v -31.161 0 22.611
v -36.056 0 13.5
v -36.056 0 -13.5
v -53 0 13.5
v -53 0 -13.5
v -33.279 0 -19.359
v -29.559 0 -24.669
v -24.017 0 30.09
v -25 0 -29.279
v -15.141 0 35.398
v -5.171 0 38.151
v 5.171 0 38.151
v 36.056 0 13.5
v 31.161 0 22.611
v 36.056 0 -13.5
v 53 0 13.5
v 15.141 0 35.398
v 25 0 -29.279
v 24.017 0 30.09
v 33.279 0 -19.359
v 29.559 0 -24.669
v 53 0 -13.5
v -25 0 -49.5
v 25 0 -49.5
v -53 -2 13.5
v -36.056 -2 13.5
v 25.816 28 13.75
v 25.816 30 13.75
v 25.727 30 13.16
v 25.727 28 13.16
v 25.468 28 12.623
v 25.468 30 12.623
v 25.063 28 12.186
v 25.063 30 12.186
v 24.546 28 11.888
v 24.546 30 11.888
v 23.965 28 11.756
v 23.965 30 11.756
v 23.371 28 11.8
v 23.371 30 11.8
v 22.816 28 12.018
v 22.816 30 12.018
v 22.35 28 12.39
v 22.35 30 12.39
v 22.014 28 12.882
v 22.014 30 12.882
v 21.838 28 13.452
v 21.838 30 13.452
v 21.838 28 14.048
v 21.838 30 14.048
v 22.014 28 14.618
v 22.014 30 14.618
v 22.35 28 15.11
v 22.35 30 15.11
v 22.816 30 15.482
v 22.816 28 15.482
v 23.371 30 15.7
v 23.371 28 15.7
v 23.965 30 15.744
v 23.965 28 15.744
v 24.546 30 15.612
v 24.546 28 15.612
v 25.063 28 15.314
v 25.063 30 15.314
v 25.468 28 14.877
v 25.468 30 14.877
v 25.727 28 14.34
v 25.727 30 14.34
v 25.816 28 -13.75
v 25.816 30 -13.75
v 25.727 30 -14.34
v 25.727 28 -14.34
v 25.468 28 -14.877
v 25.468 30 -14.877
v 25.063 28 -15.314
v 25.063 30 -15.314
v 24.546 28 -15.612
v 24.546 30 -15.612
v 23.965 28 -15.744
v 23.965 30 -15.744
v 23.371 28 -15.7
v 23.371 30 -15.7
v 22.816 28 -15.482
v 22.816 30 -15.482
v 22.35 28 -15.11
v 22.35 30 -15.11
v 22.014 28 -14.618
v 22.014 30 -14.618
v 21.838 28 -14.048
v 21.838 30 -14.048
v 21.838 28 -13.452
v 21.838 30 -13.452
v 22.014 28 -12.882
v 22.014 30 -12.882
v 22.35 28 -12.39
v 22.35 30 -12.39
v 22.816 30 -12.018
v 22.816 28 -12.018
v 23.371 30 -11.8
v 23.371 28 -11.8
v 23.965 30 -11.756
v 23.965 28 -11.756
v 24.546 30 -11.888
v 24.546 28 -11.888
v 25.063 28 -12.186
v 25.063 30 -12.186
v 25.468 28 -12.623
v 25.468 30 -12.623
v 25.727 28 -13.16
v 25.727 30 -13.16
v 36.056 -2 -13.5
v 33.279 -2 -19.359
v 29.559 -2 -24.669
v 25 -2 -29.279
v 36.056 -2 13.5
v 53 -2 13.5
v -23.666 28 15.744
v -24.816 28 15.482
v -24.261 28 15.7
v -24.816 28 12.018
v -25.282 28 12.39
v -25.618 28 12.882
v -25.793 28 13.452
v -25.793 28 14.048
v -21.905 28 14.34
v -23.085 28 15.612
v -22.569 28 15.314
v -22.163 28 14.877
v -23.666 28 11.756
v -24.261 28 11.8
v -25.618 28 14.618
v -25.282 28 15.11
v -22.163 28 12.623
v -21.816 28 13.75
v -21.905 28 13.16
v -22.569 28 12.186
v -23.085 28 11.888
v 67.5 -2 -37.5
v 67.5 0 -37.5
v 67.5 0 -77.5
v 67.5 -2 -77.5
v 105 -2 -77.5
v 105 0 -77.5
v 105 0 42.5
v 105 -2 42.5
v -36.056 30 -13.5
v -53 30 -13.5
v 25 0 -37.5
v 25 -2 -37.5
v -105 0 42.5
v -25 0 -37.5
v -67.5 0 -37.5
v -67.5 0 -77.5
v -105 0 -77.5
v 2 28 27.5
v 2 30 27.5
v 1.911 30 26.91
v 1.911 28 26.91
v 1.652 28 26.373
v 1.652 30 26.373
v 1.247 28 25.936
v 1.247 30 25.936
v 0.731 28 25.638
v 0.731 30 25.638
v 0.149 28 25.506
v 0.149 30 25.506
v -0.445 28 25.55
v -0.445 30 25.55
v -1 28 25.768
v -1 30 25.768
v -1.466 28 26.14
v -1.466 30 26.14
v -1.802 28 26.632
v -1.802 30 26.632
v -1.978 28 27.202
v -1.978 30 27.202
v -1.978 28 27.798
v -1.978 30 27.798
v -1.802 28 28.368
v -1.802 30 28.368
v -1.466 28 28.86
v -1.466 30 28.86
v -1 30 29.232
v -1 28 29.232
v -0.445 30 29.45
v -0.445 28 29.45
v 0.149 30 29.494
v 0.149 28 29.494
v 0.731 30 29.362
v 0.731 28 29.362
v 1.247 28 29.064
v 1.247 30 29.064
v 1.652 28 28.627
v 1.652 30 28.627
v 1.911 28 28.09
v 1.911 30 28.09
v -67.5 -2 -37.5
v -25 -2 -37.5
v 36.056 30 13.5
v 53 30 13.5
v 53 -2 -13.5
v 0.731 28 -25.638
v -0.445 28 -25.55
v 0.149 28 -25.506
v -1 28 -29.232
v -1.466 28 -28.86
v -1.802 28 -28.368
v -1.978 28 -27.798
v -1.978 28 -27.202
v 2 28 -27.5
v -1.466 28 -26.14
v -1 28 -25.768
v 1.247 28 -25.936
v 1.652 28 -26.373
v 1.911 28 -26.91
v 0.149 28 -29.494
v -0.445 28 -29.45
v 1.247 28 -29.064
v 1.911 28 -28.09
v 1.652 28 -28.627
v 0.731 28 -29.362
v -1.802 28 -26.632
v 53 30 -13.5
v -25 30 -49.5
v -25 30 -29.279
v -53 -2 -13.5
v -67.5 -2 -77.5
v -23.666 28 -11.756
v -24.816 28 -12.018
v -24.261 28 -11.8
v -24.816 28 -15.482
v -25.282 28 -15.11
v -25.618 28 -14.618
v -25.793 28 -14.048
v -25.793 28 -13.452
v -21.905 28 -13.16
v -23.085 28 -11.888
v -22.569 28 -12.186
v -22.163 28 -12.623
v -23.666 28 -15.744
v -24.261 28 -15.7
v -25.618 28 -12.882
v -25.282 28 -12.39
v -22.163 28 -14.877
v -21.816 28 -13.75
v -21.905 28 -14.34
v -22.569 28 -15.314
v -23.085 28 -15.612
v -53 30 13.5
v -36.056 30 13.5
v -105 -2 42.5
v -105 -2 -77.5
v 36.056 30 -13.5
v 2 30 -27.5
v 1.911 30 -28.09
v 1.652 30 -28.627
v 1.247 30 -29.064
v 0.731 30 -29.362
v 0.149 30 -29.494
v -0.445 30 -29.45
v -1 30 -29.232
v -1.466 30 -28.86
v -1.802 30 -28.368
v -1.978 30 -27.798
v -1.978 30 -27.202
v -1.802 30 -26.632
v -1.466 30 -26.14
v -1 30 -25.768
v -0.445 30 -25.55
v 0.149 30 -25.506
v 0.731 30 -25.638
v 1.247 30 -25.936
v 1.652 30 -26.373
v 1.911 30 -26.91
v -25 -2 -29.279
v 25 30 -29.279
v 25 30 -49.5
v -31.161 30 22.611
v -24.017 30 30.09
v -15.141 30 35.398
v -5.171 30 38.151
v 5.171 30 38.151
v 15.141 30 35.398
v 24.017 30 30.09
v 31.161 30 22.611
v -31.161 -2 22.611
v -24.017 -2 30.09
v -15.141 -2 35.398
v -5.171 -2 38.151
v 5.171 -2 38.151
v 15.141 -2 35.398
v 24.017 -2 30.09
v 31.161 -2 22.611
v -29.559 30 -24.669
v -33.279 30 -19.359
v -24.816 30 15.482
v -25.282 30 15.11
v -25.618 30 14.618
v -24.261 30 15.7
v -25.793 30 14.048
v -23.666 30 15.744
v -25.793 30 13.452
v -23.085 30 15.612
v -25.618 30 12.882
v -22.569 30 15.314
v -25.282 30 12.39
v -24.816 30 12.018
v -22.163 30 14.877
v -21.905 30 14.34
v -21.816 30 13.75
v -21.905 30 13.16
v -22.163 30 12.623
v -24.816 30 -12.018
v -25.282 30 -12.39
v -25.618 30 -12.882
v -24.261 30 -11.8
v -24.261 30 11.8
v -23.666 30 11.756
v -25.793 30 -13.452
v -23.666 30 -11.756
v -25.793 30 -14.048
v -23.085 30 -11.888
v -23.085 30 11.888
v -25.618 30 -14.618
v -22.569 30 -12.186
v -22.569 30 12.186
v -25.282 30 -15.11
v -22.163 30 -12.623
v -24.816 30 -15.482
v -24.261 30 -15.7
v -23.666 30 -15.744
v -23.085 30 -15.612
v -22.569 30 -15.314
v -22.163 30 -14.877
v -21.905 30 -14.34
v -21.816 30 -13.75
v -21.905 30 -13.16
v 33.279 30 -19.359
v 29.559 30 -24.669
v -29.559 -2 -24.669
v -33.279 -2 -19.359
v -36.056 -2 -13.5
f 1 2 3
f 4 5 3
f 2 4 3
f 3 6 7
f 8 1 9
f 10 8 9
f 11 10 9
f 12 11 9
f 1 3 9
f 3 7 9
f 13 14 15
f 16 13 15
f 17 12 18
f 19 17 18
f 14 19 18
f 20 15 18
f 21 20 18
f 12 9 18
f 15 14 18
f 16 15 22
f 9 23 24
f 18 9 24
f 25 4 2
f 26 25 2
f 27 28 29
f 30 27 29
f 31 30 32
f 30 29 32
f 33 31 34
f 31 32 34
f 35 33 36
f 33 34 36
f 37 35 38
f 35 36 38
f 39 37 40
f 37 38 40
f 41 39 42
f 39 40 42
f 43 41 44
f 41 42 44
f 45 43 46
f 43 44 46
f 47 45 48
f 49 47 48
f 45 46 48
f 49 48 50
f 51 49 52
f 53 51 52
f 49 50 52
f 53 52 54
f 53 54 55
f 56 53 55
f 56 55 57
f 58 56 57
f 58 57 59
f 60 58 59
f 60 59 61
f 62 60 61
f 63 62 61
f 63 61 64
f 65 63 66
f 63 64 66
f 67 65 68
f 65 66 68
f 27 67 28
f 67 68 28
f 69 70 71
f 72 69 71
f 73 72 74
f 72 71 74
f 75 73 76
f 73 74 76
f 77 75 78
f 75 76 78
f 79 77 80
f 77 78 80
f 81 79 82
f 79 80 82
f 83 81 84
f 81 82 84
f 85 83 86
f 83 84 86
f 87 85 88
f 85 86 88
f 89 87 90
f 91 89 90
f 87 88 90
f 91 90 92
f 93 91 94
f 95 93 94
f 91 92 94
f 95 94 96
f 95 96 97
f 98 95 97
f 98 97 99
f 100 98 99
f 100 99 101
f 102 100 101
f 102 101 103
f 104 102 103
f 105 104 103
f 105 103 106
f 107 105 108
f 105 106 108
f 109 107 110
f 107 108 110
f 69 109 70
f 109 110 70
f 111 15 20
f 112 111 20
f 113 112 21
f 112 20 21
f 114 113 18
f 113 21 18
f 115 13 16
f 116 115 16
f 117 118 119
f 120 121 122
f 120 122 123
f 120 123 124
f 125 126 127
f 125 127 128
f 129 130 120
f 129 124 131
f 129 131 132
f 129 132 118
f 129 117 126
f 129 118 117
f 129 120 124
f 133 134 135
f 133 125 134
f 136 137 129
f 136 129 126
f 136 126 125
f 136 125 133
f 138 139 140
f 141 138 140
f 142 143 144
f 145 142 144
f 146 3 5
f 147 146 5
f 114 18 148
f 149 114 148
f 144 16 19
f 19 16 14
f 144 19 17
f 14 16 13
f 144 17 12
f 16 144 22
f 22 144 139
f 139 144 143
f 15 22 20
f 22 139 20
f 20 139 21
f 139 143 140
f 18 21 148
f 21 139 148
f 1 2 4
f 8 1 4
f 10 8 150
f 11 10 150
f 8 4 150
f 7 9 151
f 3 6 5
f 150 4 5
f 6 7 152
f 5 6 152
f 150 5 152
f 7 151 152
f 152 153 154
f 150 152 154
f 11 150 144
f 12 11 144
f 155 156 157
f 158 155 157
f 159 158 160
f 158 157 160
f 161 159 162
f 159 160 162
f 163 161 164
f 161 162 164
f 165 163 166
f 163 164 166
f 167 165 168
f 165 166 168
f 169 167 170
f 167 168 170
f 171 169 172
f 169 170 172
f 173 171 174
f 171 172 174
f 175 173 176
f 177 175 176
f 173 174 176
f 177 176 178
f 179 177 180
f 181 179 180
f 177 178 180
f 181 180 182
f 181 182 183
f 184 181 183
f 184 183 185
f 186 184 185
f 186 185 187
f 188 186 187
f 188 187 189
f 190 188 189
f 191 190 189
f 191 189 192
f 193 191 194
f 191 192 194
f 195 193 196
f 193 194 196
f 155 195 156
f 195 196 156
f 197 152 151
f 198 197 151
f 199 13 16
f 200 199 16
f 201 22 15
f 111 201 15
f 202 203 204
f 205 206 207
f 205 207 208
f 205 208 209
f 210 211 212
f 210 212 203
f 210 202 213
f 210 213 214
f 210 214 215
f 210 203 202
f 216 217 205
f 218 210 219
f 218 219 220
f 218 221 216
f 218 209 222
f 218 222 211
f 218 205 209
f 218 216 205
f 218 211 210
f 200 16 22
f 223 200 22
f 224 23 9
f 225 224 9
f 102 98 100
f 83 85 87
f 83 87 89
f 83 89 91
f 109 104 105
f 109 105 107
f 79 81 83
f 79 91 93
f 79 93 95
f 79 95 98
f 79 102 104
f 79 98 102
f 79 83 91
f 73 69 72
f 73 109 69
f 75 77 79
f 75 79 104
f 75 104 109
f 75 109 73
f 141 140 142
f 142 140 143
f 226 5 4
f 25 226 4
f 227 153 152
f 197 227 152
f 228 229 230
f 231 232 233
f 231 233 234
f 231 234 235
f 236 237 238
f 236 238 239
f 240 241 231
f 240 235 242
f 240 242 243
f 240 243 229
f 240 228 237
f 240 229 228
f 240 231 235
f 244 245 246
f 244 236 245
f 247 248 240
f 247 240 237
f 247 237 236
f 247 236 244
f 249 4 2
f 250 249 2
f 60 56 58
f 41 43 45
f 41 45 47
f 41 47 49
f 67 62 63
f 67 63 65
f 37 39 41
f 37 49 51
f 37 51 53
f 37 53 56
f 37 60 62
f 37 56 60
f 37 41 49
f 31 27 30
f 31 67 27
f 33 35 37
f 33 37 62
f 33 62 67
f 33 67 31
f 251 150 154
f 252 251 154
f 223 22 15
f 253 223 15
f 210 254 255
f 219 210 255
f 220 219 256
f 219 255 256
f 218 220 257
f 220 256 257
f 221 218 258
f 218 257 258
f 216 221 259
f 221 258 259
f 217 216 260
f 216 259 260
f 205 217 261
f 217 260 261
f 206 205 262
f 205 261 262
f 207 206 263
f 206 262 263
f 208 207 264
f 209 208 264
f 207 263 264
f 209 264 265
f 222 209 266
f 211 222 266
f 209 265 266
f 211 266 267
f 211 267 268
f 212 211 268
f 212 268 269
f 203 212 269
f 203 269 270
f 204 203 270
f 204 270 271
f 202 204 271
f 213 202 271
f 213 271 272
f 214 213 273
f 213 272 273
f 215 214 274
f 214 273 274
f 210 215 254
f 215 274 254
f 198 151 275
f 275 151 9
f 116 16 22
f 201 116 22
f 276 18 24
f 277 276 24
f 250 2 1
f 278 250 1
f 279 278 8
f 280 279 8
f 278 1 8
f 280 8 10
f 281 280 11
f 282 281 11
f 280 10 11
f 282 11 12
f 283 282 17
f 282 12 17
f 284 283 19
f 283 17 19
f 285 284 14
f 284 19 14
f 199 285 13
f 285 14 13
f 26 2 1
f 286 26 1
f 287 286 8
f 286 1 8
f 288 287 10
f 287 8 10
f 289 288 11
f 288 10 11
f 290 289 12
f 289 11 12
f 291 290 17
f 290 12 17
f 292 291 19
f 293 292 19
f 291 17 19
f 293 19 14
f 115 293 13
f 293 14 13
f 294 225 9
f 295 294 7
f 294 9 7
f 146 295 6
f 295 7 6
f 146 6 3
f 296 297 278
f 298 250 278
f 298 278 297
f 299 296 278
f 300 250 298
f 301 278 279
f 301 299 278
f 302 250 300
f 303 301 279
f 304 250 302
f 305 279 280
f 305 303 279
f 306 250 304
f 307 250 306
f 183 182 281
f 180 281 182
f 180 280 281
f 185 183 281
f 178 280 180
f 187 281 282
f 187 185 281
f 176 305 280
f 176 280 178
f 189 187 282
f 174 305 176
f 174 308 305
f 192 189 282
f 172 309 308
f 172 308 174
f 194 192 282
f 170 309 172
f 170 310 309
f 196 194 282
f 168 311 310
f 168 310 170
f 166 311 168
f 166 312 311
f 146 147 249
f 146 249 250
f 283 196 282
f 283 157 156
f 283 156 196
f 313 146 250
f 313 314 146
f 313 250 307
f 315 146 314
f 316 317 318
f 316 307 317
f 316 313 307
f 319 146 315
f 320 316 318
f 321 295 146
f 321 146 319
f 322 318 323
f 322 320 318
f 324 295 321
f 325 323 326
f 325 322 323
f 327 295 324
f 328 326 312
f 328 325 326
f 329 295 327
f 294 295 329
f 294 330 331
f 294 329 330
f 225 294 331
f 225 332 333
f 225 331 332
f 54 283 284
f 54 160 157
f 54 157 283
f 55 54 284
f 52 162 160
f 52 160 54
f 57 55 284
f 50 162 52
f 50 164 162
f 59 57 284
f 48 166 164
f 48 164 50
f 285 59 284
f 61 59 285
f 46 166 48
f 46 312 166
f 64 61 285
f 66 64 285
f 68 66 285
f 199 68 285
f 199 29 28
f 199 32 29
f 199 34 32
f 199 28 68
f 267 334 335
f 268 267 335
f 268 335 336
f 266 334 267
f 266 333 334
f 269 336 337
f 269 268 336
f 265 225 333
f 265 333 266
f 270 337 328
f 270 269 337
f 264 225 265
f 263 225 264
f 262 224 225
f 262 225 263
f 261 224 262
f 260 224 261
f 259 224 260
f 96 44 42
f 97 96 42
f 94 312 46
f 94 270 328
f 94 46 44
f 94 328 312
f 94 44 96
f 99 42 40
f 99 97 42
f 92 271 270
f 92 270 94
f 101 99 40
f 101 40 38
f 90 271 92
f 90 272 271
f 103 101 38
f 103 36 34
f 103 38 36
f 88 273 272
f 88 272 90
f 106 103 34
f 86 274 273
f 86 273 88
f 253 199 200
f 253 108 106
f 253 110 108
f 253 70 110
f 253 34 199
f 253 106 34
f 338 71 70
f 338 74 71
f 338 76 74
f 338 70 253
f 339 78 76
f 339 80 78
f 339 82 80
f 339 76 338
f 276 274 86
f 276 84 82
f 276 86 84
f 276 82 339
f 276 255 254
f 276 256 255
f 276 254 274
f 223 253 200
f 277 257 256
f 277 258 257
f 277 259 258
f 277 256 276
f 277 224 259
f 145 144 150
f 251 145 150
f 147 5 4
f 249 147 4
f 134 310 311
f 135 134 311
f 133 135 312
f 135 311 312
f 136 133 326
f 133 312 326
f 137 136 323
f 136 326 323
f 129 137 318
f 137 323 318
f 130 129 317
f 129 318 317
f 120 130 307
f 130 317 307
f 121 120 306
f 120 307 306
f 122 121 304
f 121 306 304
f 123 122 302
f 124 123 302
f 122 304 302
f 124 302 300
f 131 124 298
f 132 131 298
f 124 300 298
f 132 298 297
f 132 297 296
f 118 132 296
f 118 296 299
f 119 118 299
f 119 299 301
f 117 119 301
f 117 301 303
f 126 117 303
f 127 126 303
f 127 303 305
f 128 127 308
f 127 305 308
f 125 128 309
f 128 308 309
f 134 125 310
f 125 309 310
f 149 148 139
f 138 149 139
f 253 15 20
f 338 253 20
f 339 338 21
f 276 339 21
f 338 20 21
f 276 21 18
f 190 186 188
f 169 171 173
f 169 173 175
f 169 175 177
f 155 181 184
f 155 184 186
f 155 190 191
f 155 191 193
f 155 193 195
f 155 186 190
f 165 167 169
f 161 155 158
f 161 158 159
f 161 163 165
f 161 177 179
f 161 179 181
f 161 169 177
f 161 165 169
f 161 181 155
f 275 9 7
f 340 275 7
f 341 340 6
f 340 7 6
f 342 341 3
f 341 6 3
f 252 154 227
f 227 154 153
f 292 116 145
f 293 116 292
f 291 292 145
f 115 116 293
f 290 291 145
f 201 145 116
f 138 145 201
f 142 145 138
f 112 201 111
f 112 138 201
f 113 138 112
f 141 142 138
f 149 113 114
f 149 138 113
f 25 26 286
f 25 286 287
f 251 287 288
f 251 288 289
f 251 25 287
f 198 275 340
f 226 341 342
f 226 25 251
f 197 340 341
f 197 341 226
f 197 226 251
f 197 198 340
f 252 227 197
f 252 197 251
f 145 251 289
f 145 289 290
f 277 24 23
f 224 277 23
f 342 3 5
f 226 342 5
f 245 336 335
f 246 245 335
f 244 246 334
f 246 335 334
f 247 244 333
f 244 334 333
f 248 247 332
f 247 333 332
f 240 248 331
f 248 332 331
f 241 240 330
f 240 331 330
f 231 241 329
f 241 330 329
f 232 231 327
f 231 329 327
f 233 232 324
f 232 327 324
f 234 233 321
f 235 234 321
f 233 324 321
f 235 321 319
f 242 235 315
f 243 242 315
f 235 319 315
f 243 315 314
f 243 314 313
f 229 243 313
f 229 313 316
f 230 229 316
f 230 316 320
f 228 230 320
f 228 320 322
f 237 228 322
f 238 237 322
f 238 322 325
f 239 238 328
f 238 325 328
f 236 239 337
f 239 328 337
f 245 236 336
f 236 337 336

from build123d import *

# Parameters (mm, degrees)
BOSS_EXTRUDE1_DEPTH = 30
BOSS_EXTRUDE2_DEPTH = 2
SKETCH3_R           = 2
CUT_EXTRUDE1_DEPTH  = 2


with BuildPart() as part:
    # Sketch1 → Boss-Extrude1 (new body)
    with BuildSketch(Plane(origin=(0, 0, 0), x_dir=(1, 0, 0), z_dir=(0, 1, 0))):
        with BuildLine():
            Line((36.055512755, -13.5), (-36.055512755, -13.5))
            ThreePointArc((-36.055512755, -13.5), (0, -38.5), (36.055512755, -13.5))
        make_face()
        with BuildLine():
            Line((36.055512755, 13.5), (-36.055512755, 13.5))
            ThreePointArc((-36.055512755, 13.5), (-38.5, 0), (-36.055512755, -13.5))
            Line((-36.055512755, -13.5), (36.055512755, -13.5))
            ThreePointArc((36.055512755, -13.5), (37.883949379, -6.859765264), (38.5, 0))
            ThreePointArc((38.5, 0), (37.883949379, 6.859765264), (36.055512755, 13.5))
        make_face()
        with BuildLine():
            Line((-36.055512755, 13.5), (-53, 13.5))
            Line((-53, 13.5), (-53, -13.5))
            Line((-53, -13.5), (-36.055512755, -13.5))
            ThreePointArc((-36.055512755, -13.5), (-38.5, 0), (-36.055512755, 13.5))
        make_face()
        with BuildLine():
            ThreePointArc((25, 29.278831944), (0, 38.5), (-25, 29.278831944))
            Line((-25, 29.278831944), (-25, 27.5))
            Line((-25, 27.5), (25, 27.5))
            Line((25, 27.5), (25, 29.278831944))
        make_face()
        with BuildLine():
            Line((53, 13.5), (36.055512755, 13.5))
            ThreePointArc((36.055512755, 13.5), (37.883949379, 6.859765264), (38.5, 0))
            ThreePointArc((38.5, 0), (37.883949379, -6.859765264), (36.055512755, -13.5))
            Line((36.055512755, -13.5), (53, -13.5))
            Line((53, -13.5), (53, 13.5))
        make_face()
        with BuildLine():
            ThreePointArc((-25, 29.278831944), (-31.530727772, 22.092152593), (-36.055512755, 13.5))
            Line((-36.055512755, 13.5), (36.055512755, 13.5))
            ThreePointArc((36.055512755, 13.5), (31.530727772, 22.092152593), (25, 29.278831944))
            Line((25, 29.278831944), (25, 27.5))
            Line((25, 27.5), (-25, 27.5))
            Line((-25, 27.5), (-25, 29.278831944))
        make_face()
        with BuildLine():
            Line((-25, 49.5), (-25, 29.278831944))
            ThreePointArc((-25, 29.278831944), (0, 38.5), (25, 29.278831944))
            Line((25, 29.278831944), (25, 49.5))
            Line((25, 49.5), (-25, 49.5))
        make_face()
    extrude(amount=BOSS_EXTRUDE1_DEPTH)

    # Sketch3 → Cut-Extrude1 (cut)
    with BuildSketch(Plane(origin=(0, 30, 0), x_dir=(1, 0, 0), z_dir=(0, 1, 0))):
        with Locations((0, 27.5)):
            Circle(SKETCH3_R)
        with Locations((23.815698604, 13.75)):
            Circle(SKETCH3_R)
        with Locations((23.815698604, -13.75)):
            Circle(SKETCH3_R)
        with Locations((0, -27.5)):
            Circle(SKETCH3_R)
        with Locations((-23.815698604, -13.75)):
            Circle(SKETCH3_R)
        with Locations((-23.815698604, 13.75)):
            Circle(SKETCH3_R)
    extrude(amount=-CUT_EXTRUDE1_DEPTH, mode=Mode.SUBTRACT)


with BuildPart() as body_2:
    # Sketch2 → Boss-Extrude2 (new body)
    with BuildSketch(Plane(origin=(0, 0, 0), x_dir=(-1, 0, 0), z_dir=(0, -1, 0))):
        with BuildLine():
            Line((-105, -42.5), (105, -42.5))
            Line((105, -42.5), (105, 77.5))
            Line((105, 77.5), (67.5, 77.5))
            Line((67.5, 77.5), (67.5, 37.5))
            Line((67.5, 37.5), (25, 37.5))
            Line((25, 37.5), (25, 29.278831944))
            ThreePointArc((25, 29.278831944), (31.530727772, 22.092152593), (36.055512755, 13.5))
            Line((36.055512755, 13.5), (53, 13.5))
            Line((53, 13.5), (53, -13.5))
            Line((53, -13.5), (36.055512755, -13.5))
            ThreePointArc((36.055512755, -13.5), (0, -38.5), (-36.055512755, -13.5))
            Line((-36.055512755, -13.5), (-53, -13.5))
            Line((-53, -13.5), (-53, 13.5))
            Line((-53, 13.5), (-36.055512755, 13.5))
            ThreePointArc((-36.055512755, 13.5), (-31.530727772, 22.092152593), (-25, 29.278831944))
            Line((-25, 29.278831944), (-25, 37.5))
            Line((-25, 37.5), (-67.5, 37.5))
            Line((-67.5, 37.5), (-67.5, 77.5))
            Line((-67.5, 77.5), (-105, 77.5))
            Line((-105, 77.5), (-105, -42.5))
        make_face()
    extrude(amount=BOSS_EXTRUDE2_DEPTH)


solid = Compound([part.part, body_2.part])
